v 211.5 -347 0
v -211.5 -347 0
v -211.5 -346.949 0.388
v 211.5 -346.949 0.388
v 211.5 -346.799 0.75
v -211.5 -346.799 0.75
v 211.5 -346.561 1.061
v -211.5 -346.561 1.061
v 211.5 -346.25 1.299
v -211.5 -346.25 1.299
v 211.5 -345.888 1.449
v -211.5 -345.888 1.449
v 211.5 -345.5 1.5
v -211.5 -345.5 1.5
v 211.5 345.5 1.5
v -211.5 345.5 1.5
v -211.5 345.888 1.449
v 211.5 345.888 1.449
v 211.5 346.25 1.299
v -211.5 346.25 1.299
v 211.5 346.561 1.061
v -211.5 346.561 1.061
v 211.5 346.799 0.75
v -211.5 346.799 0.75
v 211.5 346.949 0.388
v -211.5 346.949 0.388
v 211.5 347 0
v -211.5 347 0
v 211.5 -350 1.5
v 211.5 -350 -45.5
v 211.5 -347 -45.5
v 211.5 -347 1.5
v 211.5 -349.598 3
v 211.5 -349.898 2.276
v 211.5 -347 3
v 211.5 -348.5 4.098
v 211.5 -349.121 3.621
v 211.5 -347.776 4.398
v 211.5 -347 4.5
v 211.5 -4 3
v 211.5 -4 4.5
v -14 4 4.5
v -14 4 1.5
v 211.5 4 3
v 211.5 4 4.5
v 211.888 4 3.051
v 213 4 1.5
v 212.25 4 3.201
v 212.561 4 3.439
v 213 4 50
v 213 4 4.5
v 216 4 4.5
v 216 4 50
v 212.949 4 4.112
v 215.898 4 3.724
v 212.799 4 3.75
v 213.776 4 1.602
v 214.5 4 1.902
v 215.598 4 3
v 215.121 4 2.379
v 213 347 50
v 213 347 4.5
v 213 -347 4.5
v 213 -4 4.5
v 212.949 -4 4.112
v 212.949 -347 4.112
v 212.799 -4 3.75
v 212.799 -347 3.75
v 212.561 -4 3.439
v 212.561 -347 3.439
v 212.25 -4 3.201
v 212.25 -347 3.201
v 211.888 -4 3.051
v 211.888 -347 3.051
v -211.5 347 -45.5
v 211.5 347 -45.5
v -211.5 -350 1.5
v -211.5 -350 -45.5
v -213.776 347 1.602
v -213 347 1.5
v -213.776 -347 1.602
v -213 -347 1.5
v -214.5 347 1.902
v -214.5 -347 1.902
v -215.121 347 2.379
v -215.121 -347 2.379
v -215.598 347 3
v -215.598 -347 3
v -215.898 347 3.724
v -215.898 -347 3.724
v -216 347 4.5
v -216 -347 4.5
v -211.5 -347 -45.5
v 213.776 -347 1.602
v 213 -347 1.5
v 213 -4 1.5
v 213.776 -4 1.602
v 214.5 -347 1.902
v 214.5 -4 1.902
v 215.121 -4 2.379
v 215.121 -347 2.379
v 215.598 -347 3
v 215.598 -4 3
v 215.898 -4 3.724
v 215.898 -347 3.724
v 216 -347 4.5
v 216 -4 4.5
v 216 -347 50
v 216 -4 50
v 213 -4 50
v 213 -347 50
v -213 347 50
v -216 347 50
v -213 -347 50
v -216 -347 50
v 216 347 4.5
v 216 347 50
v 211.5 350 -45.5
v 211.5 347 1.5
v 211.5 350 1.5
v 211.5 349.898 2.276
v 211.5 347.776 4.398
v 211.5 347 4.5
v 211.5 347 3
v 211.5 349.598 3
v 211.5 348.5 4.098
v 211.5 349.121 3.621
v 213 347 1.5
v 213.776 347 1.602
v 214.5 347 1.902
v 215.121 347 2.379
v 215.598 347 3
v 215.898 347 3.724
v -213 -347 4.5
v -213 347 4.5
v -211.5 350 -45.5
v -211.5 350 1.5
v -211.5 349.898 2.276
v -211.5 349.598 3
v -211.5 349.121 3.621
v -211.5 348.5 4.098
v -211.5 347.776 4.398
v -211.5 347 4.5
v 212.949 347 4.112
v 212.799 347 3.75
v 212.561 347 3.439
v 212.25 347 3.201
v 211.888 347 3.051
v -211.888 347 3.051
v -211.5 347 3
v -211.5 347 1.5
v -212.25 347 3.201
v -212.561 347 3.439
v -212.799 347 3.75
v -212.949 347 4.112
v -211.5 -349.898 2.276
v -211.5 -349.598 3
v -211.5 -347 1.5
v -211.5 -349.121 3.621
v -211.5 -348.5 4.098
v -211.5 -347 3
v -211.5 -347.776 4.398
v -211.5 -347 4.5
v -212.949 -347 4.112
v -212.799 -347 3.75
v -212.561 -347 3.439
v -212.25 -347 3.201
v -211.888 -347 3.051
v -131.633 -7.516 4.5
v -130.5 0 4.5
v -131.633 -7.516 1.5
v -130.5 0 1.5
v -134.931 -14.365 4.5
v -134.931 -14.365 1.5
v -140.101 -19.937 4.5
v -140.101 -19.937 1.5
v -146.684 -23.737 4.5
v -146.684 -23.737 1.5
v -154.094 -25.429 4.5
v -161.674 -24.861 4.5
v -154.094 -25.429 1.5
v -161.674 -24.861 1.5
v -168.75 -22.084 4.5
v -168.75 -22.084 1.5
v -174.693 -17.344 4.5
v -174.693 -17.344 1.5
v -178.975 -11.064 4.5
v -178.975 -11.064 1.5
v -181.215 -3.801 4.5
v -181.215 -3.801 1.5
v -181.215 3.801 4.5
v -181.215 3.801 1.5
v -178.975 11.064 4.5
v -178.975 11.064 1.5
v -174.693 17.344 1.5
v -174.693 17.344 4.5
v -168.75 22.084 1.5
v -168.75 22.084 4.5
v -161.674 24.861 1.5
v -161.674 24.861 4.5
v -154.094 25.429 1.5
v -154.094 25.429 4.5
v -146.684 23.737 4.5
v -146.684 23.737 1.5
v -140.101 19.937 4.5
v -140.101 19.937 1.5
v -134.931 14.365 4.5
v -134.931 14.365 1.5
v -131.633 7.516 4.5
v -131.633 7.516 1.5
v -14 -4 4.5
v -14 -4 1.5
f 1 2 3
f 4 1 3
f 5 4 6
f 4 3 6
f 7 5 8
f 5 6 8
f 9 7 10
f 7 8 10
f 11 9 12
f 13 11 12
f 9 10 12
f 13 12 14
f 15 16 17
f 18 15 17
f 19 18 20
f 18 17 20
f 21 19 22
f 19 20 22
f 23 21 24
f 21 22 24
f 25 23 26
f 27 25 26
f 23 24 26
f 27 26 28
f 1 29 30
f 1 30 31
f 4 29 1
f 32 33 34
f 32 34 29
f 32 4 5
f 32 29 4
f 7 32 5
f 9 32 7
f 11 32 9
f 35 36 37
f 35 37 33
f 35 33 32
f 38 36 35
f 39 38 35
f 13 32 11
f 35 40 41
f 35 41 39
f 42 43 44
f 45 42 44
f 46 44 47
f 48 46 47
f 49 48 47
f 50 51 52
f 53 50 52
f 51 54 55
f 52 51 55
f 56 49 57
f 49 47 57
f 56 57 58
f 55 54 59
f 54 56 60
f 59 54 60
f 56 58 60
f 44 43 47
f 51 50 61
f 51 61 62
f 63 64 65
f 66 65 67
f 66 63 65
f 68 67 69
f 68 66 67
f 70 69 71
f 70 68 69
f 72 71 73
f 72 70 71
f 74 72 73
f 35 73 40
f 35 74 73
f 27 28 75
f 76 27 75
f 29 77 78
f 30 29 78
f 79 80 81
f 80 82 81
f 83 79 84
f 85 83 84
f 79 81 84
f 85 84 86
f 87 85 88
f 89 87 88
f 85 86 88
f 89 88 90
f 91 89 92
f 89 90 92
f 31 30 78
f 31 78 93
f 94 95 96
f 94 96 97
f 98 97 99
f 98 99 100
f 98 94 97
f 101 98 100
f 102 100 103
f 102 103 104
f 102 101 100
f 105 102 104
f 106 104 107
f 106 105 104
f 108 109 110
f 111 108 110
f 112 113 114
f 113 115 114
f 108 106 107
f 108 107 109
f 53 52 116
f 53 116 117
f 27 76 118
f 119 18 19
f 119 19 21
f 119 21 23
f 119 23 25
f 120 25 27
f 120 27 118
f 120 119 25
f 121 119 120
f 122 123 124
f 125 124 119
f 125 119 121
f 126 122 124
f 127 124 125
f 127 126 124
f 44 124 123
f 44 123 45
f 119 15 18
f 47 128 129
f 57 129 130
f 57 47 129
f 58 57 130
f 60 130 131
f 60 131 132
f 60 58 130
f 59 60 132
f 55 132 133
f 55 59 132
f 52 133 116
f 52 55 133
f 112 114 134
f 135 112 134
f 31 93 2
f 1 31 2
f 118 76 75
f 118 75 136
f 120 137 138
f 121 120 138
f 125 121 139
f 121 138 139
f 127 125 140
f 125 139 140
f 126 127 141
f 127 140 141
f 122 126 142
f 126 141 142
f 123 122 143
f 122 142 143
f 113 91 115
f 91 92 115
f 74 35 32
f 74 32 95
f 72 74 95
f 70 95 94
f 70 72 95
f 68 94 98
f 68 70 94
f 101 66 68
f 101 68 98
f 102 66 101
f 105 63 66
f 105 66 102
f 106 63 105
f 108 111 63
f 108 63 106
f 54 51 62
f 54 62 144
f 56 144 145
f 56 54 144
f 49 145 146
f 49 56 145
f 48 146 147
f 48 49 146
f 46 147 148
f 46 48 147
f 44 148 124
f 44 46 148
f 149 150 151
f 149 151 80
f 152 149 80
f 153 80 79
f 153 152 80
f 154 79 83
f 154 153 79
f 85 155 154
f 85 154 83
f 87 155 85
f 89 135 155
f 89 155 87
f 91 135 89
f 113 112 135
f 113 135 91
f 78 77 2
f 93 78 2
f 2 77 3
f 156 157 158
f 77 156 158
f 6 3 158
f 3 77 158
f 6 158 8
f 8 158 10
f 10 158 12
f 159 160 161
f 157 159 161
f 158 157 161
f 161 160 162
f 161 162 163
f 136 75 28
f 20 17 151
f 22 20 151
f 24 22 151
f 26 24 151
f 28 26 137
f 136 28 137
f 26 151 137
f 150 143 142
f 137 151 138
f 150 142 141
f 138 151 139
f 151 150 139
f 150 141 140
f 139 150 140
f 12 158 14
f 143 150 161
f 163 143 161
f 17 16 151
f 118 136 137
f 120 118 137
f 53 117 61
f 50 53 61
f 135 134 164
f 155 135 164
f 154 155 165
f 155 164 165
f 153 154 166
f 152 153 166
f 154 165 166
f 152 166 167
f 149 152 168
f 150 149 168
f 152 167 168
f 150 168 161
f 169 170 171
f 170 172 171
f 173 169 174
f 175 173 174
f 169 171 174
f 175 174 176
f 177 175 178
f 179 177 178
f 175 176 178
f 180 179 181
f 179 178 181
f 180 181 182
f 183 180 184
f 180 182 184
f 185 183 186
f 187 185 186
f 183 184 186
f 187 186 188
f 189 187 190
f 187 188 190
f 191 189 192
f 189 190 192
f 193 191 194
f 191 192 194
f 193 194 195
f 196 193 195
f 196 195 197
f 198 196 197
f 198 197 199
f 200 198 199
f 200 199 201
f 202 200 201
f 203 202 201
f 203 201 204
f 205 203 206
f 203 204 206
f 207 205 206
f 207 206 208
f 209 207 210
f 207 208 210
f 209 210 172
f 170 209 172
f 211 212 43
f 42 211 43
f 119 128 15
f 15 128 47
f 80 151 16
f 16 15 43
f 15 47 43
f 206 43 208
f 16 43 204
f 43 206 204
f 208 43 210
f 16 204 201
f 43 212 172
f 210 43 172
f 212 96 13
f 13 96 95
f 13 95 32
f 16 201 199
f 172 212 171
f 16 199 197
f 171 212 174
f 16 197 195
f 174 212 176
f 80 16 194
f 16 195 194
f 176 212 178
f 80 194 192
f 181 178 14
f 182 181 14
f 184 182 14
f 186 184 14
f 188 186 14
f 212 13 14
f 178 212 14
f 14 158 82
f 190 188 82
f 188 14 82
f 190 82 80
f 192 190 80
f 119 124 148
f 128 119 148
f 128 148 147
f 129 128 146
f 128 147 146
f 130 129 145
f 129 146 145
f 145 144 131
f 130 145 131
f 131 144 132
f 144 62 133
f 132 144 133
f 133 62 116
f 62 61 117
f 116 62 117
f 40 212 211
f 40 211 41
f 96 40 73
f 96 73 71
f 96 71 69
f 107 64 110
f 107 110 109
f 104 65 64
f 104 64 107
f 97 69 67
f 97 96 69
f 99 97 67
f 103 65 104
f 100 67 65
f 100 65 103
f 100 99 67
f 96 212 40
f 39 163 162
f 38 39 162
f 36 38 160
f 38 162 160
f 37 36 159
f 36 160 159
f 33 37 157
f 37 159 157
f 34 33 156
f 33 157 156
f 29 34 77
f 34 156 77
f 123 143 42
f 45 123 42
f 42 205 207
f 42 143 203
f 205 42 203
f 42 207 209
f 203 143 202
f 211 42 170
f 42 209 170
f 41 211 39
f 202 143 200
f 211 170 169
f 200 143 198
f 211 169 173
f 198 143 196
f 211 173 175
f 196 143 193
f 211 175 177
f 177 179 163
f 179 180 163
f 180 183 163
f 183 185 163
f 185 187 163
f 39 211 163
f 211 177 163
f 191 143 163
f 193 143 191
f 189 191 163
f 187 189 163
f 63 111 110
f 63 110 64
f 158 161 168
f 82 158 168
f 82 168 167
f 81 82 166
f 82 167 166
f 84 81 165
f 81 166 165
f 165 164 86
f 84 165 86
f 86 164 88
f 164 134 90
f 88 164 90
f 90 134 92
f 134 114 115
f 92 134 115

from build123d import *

# Parameters (mm, degrees)
F1_DEPTH      = 211.5
F1_DEPTH_BACK = 70
F3_DEPTH      = 347
F3_DEPTH_BACK = 347
F5_W          = 233.843906
F5_H          = 8
F6_DEPTH      = 80
F7_R          = 25.5
F8_DEPTH      = 12.5


with BuildPart() as f1:
    # F0 (on Right) → F1 (new body, two sides)
    with BuildSketch(Plane.YZ) as f1_sk:
        with BuildLine():
            ThreePointArc((-347, 4.5), (-349.12132, 3.62132), (-350, 1.5))
            Line((-350, 1.5), (-350, -45.5))
            Line((-350, -45.5), (-347, -45.5))
            Line((-347, -45.5), (-347, 0))
            ThreePointArc((-347, 0), (-346.56066, 1.06066), (-345.5, 1.5))
            Line((-345.5, 1.5), (345.5, 1.5))
            ThreePointArc((345.5, 1.5), (346.56066, 1.06066), (347, 0))
            Line((347, 0), (347, -45.5))
            Line((347, -45.5), (350, -45.5))
            Line((350, -45.5), (350, 1.5))
            ThreePointArc((350, 1.5), (349.12132, 3.62132), (347, 4.5))
            Line((347, 4.5), (-347, 4.5))
        make_face()
    extrude(amount=F1_DEPTH)
    extrude(f1_sk.sketch, amount=-F1_DEPTH_BACK)

    # F2 (on Front) → F3 (join, two sides)
    with BuildSketch(Plane.XZ) as f3_sk:
        with BuildLine():
            Line((216, 50), (213, 50))
            Line((213, 50), (213, 4.5))
            ThreePointArc((213, 4.5), (212.56066, 3.43934), (211.5, 3))
            Line((211.5, 3), (211.5, 1.5))
            Line((211.5, 1.5), (213, 1.5))
            ThreePointArc((213, 1.5), (215.12132, 2.37868), (216, 4.5))
            Line((216, 4.5), (216, 50))
        make_face()
    extrude(amount=F3_DEPTH)
    extrude(f3_sk.sketch, amount=-F3_DEPTH_BACK)

    # F4: F1 across plane


with BuildPart() as f1_1:
    add(f1.part)
    add(f1.part.mirror(Plane.YZ))

    # F5 (on Top) → F6 (cut)
    with BuildSketch(Plane.XY):
        with Locations((102.921953, 0)):
            Rectangle(F5_W, F5_H)
    extrude(amount=F6_DEPTH, mode=Mode.SUBTRACT)

    # F7 (on face) → F8 (cut, symmetric)
    with BuildSketch(Plane(origin=(0, 0, 1.5), x_dir=(1, 0, 0), z_dir=(0, 0, -1))):
        with Locations((-156, 0)):
            Circle(F7_R)
    extrude(amount=F8_DEPTH, both=True, mode=Mode.SUBTRACT)


solid = f1_1.part
